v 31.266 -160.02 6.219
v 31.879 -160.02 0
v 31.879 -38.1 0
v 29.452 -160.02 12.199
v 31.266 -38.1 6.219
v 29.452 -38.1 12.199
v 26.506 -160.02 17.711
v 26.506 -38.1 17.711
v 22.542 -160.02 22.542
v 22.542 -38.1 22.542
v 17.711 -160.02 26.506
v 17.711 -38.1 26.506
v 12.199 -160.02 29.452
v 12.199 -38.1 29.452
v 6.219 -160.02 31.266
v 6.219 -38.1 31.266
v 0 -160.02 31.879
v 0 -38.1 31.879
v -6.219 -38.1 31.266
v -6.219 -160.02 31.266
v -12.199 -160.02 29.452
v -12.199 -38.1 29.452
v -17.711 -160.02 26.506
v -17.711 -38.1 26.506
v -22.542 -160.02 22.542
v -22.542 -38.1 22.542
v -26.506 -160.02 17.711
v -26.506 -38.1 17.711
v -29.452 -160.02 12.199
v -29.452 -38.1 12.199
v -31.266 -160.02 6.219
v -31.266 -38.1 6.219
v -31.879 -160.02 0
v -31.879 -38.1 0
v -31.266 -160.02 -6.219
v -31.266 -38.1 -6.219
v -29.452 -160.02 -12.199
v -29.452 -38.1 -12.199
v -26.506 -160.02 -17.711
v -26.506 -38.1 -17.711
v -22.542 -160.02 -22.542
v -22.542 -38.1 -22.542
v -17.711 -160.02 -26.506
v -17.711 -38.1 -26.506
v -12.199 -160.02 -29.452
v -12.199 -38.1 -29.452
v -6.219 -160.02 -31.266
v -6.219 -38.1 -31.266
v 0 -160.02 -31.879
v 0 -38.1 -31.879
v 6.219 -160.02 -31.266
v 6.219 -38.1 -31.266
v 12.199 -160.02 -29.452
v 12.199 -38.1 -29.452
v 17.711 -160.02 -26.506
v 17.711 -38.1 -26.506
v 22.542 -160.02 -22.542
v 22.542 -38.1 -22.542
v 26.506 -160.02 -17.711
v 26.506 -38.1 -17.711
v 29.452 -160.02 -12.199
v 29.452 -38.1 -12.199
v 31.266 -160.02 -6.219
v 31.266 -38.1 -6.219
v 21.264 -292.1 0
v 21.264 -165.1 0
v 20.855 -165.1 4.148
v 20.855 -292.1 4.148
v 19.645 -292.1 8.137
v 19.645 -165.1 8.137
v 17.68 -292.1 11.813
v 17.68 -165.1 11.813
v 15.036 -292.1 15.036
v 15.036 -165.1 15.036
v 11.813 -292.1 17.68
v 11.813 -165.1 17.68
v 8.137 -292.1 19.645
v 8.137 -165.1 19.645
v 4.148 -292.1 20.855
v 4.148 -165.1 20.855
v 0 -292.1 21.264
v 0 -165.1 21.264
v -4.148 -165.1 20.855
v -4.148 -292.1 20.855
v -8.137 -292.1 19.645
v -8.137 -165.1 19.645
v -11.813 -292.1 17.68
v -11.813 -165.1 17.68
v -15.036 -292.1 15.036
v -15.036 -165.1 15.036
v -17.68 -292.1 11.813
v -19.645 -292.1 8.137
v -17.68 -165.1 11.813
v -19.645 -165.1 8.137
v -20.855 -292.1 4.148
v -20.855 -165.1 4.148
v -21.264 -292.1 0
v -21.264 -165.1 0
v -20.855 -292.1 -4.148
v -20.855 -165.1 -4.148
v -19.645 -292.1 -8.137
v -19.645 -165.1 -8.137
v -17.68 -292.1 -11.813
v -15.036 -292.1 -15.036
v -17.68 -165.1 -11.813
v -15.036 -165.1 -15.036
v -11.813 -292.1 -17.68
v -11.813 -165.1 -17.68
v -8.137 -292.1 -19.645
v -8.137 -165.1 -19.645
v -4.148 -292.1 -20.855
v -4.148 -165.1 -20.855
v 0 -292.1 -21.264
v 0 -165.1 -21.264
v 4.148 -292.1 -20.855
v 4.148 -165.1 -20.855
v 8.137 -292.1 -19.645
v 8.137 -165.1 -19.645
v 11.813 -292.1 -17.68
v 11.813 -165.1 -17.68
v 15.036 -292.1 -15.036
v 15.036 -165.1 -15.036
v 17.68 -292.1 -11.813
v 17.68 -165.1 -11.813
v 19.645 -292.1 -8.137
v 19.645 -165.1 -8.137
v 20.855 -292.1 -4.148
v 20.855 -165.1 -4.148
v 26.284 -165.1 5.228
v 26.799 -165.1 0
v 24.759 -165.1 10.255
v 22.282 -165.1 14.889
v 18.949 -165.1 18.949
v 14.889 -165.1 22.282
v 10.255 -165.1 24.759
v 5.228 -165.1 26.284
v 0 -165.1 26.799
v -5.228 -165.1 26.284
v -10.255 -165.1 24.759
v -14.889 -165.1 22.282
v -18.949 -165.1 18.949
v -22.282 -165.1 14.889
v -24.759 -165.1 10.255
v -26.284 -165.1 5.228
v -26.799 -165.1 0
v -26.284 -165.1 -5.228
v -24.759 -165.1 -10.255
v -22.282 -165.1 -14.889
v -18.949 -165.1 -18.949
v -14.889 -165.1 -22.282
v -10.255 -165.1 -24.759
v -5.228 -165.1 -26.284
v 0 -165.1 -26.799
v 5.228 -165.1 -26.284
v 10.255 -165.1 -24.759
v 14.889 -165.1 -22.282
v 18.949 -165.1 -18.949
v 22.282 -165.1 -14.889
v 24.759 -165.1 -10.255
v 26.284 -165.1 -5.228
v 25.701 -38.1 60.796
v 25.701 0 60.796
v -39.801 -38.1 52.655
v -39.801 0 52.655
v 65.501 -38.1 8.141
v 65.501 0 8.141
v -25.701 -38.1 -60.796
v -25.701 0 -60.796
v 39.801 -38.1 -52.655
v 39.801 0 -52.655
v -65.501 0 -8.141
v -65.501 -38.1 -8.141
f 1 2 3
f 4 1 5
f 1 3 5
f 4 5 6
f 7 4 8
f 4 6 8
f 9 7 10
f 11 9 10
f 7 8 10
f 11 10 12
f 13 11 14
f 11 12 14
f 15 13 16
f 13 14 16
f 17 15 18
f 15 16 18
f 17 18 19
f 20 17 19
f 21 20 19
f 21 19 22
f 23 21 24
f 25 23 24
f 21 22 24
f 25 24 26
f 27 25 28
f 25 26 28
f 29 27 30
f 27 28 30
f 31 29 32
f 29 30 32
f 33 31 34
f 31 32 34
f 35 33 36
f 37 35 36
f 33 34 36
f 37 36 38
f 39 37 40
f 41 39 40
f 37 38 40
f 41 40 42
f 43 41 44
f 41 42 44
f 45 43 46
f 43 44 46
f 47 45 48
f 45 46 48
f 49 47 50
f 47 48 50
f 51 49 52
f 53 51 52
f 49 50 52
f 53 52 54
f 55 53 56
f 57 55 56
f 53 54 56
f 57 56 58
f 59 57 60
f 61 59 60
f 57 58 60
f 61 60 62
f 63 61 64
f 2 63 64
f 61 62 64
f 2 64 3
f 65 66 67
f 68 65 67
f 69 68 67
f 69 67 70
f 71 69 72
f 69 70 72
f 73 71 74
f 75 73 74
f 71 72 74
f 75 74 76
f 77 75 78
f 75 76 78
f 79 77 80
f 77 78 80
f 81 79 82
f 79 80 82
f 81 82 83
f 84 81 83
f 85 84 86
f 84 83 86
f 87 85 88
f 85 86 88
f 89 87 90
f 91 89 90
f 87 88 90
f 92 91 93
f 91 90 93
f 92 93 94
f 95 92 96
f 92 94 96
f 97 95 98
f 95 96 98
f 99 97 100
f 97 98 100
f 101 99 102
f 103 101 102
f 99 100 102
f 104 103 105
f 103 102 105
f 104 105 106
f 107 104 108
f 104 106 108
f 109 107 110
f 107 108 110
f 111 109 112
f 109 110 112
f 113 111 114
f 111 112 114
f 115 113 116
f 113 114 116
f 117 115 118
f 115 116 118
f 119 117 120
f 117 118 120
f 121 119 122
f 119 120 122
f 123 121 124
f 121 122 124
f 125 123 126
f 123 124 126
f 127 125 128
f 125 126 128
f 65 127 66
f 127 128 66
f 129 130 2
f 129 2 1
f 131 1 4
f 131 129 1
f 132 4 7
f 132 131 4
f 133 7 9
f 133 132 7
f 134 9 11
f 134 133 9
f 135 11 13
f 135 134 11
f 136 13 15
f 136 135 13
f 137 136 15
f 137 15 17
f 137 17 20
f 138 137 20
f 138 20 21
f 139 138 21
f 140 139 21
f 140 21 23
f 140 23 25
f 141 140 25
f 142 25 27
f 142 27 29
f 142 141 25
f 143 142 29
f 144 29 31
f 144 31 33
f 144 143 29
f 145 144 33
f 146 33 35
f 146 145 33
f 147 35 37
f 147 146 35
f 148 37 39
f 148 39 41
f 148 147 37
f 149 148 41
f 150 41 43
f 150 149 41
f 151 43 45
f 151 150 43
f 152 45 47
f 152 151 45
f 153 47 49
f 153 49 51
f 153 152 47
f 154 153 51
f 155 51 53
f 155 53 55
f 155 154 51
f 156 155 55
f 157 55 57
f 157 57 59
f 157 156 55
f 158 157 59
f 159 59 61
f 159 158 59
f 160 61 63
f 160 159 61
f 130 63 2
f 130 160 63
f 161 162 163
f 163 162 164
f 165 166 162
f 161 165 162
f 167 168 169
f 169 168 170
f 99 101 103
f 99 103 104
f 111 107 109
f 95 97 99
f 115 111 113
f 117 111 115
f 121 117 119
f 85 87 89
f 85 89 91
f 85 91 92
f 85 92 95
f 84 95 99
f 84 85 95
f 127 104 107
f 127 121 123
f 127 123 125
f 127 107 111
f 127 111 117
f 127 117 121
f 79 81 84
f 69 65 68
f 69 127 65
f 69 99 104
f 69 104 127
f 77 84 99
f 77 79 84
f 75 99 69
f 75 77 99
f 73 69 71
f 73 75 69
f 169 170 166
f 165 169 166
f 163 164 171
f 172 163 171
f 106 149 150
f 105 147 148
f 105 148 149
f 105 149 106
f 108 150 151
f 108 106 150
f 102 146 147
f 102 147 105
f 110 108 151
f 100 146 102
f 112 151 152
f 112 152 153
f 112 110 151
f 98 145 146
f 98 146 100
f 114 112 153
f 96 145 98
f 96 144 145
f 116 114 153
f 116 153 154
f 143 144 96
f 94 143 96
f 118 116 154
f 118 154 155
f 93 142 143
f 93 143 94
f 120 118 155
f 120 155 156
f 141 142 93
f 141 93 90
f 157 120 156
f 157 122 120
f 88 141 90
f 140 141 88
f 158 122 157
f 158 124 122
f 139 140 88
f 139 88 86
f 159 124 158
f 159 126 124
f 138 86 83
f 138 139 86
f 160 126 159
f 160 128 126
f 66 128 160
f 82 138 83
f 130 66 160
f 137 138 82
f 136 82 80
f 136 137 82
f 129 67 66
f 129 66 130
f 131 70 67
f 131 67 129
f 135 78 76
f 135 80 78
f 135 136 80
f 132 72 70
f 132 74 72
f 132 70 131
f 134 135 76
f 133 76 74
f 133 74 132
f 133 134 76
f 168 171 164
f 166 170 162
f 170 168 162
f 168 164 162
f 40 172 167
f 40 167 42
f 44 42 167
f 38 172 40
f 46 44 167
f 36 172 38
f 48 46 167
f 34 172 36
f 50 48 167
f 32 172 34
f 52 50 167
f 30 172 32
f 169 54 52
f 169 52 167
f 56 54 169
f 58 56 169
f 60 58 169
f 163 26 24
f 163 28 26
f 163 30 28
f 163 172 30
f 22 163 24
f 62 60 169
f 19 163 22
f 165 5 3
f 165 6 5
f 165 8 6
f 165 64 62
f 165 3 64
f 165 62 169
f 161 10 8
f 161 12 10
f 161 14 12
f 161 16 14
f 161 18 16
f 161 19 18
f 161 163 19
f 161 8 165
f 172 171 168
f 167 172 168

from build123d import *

# Parameters (mm, degrees)
F1_DEPTH = 38.1
F2_R     = 31.878636
F3_DEPTH = 127
F4_SIZE  = 5.08
F5_R     = 21.263534
F6_DEPTH = 127


with BuildPart() as f1:
    # F0 (on Front) → F1 (new body)
    with BuildSketch(Plane.XZ):
        Polygon((39.800733, -52.655495), (65.501363, 8.140698), (25.70063, 60.796193), (-39.800733, 52.655495), (-65.501363, -8.140698), (-25.70063, -60.796193), align=None)
    extrude(amount=F1_DEPTH)

    # F2 (on face) → F3 (join)
    with BuildSketch(Plane.XZ.offset(38.1)):
        Circle(F2_R)
    extrude(amount=F3_DEPTH)

    # F4
    f4_edges = [f1.edges().sort_by_distance(p)[0] for p in [
        (-31.878636, -165.1, 0),
    ]]
    chamfer(f4_edges, length=F4_SIZE)

    # F5 (on face) → F6 (join)
    with BuildSketch(Plane.XZ.offset(165.1)):
        Circle(F5_R)
    extrude(amount=F6_DEPTH)


solid = f1.part
